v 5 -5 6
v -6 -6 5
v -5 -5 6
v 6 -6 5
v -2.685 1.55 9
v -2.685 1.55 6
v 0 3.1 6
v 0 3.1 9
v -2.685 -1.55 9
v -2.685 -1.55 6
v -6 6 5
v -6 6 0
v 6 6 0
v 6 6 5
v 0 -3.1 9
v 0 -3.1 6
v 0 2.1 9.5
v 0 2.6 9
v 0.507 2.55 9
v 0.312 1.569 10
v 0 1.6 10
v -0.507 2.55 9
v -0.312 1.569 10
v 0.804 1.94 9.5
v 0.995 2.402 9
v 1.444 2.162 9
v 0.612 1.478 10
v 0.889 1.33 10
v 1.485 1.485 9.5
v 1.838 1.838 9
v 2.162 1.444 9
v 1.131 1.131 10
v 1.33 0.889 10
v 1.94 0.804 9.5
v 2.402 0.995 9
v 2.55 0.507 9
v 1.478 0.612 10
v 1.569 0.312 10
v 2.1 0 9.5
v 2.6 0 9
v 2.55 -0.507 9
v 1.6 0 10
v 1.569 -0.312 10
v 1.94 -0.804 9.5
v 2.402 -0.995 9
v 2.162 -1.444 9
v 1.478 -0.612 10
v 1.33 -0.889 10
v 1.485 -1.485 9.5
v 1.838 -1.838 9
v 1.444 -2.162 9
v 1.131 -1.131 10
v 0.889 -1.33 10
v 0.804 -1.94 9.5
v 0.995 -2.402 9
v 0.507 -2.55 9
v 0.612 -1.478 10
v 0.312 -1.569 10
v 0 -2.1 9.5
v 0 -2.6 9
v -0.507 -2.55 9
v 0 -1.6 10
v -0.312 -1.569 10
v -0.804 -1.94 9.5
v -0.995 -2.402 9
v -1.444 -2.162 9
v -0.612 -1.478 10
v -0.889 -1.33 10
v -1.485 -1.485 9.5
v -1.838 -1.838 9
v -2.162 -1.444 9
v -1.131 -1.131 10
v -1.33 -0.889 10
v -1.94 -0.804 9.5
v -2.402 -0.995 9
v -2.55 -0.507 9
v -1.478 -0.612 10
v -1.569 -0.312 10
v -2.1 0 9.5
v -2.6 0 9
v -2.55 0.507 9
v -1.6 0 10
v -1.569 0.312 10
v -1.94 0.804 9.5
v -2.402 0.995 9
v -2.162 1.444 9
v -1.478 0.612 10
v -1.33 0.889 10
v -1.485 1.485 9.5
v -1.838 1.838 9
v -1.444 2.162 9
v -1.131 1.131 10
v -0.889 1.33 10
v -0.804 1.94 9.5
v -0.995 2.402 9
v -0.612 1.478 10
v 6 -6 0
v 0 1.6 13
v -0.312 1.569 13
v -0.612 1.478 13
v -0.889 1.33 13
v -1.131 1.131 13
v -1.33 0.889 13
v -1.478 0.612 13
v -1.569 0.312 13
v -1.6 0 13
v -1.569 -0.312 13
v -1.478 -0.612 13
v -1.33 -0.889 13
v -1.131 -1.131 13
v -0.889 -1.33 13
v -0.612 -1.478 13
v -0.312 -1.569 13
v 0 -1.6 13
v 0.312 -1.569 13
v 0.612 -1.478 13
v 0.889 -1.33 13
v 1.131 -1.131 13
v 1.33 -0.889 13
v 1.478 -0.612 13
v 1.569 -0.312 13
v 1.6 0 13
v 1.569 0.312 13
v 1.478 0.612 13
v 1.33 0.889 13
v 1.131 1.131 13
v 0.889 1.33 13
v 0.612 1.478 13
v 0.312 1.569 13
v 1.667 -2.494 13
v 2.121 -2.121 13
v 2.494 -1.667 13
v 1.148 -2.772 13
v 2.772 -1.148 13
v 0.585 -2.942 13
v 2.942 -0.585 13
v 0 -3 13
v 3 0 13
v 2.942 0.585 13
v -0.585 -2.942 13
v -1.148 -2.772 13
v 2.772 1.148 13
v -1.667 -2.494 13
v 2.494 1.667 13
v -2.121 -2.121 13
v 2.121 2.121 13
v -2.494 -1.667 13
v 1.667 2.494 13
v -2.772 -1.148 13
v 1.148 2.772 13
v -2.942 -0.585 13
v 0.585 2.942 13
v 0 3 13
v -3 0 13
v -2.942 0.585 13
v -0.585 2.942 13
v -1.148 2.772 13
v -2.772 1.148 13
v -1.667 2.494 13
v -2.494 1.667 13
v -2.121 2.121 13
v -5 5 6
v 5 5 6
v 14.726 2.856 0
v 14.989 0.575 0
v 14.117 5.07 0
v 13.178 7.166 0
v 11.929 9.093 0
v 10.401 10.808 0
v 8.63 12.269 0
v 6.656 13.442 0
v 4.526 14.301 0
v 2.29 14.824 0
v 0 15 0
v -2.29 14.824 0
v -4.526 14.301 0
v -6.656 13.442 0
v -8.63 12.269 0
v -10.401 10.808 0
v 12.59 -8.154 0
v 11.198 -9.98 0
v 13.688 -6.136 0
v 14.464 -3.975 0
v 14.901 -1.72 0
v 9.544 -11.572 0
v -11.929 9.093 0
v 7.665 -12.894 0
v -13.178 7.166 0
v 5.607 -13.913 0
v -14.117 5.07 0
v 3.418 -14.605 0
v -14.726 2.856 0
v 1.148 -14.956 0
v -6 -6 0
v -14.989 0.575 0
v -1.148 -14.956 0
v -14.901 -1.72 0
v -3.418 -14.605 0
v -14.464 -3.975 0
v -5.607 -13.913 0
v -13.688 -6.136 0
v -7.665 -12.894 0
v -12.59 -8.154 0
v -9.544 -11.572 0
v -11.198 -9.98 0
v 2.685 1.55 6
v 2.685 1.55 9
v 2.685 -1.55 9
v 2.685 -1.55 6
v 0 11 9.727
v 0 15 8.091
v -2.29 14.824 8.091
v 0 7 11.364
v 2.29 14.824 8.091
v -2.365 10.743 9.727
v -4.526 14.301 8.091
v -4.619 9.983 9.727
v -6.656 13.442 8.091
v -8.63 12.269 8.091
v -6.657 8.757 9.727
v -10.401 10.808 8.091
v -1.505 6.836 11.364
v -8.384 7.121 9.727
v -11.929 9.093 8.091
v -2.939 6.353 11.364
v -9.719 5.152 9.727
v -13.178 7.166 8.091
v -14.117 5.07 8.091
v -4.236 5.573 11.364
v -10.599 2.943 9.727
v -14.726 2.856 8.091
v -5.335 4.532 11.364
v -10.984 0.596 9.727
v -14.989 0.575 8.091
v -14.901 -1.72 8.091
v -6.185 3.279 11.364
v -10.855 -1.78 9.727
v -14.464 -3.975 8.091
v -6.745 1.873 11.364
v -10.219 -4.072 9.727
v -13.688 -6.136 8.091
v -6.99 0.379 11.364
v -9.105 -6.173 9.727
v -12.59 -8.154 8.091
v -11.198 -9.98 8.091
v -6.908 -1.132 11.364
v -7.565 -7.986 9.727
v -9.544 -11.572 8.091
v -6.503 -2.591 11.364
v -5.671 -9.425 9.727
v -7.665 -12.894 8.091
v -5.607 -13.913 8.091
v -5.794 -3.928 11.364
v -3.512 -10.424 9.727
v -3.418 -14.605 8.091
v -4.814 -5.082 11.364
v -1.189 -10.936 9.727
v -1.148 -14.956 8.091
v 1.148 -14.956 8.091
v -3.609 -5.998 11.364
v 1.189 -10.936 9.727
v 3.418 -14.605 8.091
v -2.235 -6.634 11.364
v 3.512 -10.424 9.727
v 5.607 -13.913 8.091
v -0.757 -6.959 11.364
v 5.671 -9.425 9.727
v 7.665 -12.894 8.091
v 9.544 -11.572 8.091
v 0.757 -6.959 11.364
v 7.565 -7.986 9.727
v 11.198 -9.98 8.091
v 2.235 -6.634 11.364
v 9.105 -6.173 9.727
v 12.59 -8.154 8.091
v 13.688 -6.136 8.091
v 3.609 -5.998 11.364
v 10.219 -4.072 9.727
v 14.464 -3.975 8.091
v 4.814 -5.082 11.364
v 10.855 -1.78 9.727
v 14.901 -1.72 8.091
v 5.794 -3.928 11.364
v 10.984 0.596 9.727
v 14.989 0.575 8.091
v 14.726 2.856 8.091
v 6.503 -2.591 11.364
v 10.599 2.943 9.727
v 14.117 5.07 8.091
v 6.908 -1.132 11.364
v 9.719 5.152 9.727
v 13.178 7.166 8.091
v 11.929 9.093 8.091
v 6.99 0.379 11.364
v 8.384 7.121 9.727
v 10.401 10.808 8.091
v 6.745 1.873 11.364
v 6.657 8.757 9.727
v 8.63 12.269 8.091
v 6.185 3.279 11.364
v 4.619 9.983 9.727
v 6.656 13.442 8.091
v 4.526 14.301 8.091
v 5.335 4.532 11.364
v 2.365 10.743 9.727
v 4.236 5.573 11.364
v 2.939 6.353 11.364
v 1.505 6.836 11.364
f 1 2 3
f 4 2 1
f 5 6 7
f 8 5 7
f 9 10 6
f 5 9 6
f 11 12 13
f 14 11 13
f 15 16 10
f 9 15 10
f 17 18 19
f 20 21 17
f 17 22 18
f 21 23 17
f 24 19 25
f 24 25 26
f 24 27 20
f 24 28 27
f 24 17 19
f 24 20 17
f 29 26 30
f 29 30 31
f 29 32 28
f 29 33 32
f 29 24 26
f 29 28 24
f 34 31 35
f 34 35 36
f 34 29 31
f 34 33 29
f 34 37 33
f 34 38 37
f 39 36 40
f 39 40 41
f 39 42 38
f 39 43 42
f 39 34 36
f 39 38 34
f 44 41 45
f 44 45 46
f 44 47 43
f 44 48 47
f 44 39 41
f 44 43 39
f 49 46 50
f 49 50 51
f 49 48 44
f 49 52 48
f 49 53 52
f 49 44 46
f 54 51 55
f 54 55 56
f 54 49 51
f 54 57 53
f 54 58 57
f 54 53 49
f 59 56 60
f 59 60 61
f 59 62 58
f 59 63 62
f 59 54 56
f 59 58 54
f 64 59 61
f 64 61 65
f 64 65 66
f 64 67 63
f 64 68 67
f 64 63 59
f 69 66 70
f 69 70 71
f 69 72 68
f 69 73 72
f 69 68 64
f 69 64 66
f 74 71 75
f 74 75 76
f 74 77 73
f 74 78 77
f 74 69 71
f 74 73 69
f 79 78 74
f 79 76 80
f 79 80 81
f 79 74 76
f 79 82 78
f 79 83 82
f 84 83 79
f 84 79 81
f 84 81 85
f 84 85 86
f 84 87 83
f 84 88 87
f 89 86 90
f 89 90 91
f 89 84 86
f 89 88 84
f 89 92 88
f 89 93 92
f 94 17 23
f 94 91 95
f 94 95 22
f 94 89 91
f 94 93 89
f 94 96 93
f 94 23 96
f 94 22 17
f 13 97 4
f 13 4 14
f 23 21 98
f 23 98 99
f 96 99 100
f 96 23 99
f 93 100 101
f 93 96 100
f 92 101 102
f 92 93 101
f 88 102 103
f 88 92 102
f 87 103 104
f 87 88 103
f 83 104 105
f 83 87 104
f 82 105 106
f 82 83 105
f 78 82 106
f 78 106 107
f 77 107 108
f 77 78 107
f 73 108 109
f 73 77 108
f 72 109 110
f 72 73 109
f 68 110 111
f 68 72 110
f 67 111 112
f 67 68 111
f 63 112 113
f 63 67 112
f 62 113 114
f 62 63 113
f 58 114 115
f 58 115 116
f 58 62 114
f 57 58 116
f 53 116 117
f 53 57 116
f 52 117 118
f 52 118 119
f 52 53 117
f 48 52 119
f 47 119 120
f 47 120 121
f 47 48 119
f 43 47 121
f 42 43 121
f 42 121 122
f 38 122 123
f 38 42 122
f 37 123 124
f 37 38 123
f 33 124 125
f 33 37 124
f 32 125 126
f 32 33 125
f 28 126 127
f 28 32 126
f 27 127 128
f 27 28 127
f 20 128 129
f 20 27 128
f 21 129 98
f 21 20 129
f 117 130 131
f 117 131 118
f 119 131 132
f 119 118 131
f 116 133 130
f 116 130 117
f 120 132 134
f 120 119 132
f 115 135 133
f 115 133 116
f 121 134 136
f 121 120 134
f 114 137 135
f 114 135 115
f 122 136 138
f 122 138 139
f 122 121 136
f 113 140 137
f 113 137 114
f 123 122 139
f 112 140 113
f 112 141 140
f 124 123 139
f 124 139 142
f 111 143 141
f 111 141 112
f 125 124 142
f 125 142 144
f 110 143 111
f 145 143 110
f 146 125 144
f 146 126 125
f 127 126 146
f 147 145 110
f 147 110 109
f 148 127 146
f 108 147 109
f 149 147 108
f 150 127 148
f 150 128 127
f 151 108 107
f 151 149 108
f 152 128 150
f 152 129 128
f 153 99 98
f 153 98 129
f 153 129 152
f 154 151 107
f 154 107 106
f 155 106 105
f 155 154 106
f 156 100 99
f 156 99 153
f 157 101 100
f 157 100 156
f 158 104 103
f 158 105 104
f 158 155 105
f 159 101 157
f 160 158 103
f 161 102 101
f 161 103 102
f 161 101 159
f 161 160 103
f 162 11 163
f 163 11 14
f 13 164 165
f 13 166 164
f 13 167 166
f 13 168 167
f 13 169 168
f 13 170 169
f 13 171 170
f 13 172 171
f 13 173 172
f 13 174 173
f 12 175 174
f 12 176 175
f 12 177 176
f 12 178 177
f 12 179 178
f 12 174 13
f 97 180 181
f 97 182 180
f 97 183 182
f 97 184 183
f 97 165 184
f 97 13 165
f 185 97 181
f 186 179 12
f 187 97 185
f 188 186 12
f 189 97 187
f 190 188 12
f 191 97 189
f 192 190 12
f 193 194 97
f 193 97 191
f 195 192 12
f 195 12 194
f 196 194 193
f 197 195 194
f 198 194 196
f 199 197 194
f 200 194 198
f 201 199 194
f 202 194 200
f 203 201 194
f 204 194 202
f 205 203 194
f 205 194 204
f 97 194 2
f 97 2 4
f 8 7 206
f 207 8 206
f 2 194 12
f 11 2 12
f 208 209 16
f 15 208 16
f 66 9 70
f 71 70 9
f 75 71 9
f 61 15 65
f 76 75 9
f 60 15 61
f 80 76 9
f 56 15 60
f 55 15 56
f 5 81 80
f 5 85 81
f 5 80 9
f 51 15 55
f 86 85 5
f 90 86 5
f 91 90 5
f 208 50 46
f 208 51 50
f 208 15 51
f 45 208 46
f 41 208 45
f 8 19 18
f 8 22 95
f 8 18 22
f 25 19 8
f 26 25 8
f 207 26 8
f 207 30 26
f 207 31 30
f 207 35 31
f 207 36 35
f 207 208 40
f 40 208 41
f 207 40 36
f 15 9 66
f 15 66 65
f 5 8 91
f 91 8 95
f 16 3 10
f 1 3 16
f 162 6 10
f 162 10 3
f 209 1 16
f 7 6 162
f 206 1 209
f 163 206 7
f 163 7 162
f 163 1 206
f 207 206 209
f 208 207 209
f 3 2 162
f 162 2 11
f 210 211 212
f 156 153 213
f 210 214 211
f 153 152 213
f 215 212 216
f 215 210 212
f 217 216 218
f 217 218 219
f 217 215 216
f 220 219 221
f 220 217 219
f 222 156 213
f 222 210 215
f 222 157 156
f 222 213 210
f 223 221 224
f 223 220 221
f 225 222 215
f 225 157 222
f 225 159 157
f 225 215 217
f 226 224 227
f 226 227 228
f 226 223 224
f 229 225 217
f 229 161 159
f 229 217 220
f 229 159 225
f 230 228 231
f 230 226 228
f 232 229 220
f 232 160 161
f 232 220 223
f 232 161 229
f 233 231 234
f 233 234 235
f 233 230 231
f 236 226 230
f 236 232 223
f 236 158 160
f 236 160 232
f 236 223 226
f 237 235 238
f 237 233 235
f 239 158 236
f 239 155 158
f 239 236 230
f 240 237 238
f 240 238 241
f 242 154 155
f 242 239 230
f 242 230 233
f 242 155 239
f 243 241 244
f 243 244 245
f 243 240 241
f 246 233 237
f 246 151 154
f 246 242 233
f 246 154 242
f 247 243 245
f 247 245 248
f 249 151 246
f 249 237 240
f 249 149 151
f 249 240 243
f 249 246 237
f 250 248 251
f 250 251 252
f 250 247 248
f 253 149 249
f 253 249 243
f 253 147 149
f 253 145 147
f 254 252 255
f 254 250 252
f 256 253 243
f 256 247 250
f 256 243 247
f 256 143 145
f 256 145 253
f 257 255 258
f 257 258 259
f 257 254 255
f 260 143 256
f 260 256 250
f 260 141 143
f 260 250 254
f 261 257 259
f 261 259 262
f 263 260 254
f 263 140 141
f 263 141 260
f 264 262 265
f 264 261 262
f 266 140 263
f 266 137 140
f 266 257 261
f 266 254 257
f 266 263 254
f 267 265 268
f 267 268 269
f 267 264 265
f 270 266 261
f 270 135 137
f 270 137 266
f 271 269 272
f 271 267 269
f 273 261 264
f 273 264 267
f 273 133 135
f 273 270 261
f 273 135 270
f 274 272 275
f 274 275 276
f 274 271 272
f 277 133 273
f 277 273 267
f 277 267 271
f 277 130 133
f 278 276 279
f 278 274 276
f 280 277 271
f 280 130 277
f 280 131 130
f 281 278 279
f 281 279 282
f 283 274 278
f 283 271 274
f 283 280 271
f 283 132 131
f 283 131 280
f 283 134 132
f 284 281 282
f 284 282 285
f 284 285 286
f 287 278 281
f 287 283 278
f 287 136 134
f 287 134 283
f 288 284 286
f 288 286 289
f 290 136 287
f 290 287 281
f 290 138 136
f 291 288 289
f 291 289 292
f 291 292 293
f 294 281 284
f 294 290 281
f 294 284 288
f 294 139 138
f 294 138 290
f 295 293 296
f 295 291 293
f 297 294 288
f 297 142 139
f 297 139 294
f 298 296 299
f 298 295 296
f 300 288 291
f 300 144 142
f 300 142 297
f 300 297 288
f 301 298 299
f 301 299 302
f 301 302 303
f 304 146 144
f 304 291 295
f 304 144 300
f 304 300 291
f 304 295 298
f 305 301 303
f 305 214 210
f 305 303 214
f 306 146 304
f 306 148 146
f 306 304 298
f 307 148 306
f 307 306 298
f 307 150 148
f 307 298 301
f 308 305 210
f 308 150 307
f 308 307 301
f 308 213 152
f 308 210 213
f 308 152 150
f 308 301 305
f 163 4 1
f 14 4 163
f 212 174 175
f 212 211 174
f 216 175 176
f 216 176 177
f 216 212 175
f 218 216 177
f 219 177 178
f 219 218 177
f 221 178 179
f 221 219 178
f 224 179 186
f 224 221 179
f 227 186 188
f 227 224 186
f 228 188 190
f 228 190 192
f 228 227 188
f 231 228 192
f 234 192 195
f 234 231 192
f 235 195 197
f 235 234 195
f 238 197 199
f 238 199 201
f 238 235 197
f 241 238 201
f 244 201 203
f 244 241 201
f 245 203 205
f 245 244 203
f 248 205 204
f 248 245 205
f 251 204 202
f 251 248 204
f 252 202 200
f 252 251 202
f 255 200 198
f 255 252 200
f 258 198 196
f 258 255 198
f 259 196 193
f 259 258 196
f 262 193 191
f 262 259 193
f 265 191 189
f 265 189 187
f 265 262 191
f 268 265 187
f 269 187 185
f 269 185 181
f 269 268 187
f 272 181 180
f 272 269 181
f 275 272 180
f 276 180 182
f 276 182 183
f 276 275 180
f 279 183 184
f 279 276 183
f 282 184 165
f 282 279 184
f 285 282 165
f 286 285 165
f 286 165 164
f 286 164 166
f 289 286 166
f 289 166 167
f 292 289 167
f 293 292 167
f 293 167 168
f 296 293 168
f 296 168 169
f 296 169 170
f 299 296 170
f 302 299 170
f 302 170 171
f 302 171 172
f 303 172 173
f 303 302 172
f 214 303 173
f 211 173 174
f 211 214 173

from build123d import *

# Parameters (mm, degrees)
SKETCH_W        = 12
SKETCH_H        = 12
POCKET_DEPTH    = 6
POCKET001_DEPTH = 3
CHAMFER_SIZE    = 1
CHAMFER001_SIZE = 1


with BuildPart() as part:
    # Sketch002 → Revolution (revolve)
    with BuildSketch(Plane.YZ):
        Polygon((1.6, 13), (1.6, 0), (15, 0), (15, 8.09067), (3, 13), align=None)
    revolve(axis=Axis((0, 0, 0), (0, 0, 1)))

    # Sketch (on Face2 of Revolution) → Pocket (cut)
    with BuildSketch(Plane.YX):
        Rectangle(SKETCH_W, SKETCH_H)
    extrude(amount=-POCKET_DEPTH, mode=Mode.SUBTRACT)

    # Sketch003 (on Face2 of Pocket) → Pocket001 (cut)
    with BuildSketch(Plane.YX.offset(-6)):
        Polygon((3.1, 0), (1.55, 2.684679), (-1.55, 2.684679), (-3.1, 0), (-1.55, -2.684679), (1.55, -2.684679), align=None)
    extrude(amount=-POCKET001_DEPTH, mode=Mode.SUBTRACT)

    # Chamfer
    chamfer_edges = [part.edges().sort_by_distance(p)[0] for p in [
        (0, -6, 6),
        (0, 6, 6),
        (-6, 0, 6),
        (6, 0, 6),
    ]]
    chamfer(chamfer_edges, length=CHAMFER_SIZE)

    # Chamfer001
    chamfer001_edges = [part.edges().sort_by_distance(p)[0] for p in [
        (0, -1.6, 9),
    ]]
    chamfer(chamfer001_edges, length=CHAMFER001_SIZE)


solid = part.part
